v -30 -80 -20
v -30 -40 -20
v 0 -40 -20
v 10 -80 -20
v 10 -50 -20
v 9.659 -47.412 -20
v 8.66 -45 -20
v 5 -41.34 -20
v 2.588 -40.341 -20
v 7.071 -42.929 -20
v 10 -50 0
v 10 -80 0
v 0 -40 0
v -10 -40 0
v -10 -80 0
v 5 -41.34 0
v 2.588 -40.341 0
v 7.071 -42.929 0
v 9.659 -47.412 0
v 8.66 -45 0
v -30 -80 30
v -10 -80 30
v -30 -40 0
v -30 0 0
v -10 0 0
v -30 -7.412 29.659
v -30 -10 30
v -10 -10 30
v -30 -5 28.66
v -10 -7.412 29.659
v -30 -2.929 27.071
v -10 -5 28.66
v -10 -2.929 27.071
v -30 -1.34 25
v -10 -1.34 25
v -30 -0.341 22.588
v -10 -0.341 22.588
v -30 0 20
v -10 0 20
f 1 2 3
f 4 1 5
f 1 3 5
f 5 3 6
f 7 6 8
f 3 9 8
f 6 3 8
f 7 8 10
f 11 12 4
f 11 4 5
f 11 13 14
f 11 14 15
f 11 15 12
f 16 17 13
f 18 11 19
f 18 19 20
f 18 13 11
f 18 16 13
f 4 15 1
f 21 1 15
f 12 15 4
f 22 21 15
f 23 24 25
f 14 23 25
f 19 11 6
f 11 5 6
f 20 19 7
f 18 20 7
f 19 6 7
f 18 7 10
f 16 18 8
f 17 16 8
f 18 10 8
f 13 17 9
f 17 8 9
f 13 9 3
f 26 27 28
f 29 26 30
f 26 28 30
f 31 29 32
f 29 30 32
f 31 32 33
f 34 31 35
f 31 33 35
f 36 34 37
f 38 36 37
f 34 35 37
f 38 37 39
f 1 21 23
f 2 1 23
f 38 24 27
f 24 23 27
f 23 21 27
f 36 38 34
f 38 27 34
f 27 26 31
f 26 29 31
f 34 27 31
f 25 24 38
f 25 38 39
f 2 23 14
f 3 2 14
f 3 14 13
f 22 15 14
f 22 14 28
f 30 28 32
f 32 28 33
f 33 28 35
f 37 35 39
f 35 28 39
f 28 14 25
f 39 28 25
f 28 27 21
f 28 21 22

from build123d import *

# Parameters (mm, degrees)
SKETCH1_W           = 20
SKETCH1_H           = 80
BOSS_EXTRUDE1_DEPTH = 30
SKETCH2_W           = 40
SKETCH2_H           = 40
BOSS_EXTRUDE2_DEPTH = 20
FILLET1_R           = 10


with BuildPart() as part:
    # Sketch1 → Boss-Extrude1 (new body)
    with BuildSketch(Plane.XY):
        with Locations((-20, -40)):
            Rectangle(SKETCH1_W, SKETCH1_H)
    extrude(amount=BOSS_EXTRUDE1_DEPTH)

    # Sketch2 → Boss-Extrude2 (add)
    with BuildSketch(Plane.XY):
        with Locations((-10, -60)):
            Rectangle(SKETCH2_W, SKETCH2_H)
    extrude(amount=-BOSS_EXTRUDE2_DEPTH)

    # Fillet1
    fillet1_edges = [part.edges().sort_by_distance(p)[0] for p in [
        (10, -40, -10),
        (-20, 0, 30),
    ]]
    fillet(fillet1_edges, radius=FILLET1_R)


solid = part.part
